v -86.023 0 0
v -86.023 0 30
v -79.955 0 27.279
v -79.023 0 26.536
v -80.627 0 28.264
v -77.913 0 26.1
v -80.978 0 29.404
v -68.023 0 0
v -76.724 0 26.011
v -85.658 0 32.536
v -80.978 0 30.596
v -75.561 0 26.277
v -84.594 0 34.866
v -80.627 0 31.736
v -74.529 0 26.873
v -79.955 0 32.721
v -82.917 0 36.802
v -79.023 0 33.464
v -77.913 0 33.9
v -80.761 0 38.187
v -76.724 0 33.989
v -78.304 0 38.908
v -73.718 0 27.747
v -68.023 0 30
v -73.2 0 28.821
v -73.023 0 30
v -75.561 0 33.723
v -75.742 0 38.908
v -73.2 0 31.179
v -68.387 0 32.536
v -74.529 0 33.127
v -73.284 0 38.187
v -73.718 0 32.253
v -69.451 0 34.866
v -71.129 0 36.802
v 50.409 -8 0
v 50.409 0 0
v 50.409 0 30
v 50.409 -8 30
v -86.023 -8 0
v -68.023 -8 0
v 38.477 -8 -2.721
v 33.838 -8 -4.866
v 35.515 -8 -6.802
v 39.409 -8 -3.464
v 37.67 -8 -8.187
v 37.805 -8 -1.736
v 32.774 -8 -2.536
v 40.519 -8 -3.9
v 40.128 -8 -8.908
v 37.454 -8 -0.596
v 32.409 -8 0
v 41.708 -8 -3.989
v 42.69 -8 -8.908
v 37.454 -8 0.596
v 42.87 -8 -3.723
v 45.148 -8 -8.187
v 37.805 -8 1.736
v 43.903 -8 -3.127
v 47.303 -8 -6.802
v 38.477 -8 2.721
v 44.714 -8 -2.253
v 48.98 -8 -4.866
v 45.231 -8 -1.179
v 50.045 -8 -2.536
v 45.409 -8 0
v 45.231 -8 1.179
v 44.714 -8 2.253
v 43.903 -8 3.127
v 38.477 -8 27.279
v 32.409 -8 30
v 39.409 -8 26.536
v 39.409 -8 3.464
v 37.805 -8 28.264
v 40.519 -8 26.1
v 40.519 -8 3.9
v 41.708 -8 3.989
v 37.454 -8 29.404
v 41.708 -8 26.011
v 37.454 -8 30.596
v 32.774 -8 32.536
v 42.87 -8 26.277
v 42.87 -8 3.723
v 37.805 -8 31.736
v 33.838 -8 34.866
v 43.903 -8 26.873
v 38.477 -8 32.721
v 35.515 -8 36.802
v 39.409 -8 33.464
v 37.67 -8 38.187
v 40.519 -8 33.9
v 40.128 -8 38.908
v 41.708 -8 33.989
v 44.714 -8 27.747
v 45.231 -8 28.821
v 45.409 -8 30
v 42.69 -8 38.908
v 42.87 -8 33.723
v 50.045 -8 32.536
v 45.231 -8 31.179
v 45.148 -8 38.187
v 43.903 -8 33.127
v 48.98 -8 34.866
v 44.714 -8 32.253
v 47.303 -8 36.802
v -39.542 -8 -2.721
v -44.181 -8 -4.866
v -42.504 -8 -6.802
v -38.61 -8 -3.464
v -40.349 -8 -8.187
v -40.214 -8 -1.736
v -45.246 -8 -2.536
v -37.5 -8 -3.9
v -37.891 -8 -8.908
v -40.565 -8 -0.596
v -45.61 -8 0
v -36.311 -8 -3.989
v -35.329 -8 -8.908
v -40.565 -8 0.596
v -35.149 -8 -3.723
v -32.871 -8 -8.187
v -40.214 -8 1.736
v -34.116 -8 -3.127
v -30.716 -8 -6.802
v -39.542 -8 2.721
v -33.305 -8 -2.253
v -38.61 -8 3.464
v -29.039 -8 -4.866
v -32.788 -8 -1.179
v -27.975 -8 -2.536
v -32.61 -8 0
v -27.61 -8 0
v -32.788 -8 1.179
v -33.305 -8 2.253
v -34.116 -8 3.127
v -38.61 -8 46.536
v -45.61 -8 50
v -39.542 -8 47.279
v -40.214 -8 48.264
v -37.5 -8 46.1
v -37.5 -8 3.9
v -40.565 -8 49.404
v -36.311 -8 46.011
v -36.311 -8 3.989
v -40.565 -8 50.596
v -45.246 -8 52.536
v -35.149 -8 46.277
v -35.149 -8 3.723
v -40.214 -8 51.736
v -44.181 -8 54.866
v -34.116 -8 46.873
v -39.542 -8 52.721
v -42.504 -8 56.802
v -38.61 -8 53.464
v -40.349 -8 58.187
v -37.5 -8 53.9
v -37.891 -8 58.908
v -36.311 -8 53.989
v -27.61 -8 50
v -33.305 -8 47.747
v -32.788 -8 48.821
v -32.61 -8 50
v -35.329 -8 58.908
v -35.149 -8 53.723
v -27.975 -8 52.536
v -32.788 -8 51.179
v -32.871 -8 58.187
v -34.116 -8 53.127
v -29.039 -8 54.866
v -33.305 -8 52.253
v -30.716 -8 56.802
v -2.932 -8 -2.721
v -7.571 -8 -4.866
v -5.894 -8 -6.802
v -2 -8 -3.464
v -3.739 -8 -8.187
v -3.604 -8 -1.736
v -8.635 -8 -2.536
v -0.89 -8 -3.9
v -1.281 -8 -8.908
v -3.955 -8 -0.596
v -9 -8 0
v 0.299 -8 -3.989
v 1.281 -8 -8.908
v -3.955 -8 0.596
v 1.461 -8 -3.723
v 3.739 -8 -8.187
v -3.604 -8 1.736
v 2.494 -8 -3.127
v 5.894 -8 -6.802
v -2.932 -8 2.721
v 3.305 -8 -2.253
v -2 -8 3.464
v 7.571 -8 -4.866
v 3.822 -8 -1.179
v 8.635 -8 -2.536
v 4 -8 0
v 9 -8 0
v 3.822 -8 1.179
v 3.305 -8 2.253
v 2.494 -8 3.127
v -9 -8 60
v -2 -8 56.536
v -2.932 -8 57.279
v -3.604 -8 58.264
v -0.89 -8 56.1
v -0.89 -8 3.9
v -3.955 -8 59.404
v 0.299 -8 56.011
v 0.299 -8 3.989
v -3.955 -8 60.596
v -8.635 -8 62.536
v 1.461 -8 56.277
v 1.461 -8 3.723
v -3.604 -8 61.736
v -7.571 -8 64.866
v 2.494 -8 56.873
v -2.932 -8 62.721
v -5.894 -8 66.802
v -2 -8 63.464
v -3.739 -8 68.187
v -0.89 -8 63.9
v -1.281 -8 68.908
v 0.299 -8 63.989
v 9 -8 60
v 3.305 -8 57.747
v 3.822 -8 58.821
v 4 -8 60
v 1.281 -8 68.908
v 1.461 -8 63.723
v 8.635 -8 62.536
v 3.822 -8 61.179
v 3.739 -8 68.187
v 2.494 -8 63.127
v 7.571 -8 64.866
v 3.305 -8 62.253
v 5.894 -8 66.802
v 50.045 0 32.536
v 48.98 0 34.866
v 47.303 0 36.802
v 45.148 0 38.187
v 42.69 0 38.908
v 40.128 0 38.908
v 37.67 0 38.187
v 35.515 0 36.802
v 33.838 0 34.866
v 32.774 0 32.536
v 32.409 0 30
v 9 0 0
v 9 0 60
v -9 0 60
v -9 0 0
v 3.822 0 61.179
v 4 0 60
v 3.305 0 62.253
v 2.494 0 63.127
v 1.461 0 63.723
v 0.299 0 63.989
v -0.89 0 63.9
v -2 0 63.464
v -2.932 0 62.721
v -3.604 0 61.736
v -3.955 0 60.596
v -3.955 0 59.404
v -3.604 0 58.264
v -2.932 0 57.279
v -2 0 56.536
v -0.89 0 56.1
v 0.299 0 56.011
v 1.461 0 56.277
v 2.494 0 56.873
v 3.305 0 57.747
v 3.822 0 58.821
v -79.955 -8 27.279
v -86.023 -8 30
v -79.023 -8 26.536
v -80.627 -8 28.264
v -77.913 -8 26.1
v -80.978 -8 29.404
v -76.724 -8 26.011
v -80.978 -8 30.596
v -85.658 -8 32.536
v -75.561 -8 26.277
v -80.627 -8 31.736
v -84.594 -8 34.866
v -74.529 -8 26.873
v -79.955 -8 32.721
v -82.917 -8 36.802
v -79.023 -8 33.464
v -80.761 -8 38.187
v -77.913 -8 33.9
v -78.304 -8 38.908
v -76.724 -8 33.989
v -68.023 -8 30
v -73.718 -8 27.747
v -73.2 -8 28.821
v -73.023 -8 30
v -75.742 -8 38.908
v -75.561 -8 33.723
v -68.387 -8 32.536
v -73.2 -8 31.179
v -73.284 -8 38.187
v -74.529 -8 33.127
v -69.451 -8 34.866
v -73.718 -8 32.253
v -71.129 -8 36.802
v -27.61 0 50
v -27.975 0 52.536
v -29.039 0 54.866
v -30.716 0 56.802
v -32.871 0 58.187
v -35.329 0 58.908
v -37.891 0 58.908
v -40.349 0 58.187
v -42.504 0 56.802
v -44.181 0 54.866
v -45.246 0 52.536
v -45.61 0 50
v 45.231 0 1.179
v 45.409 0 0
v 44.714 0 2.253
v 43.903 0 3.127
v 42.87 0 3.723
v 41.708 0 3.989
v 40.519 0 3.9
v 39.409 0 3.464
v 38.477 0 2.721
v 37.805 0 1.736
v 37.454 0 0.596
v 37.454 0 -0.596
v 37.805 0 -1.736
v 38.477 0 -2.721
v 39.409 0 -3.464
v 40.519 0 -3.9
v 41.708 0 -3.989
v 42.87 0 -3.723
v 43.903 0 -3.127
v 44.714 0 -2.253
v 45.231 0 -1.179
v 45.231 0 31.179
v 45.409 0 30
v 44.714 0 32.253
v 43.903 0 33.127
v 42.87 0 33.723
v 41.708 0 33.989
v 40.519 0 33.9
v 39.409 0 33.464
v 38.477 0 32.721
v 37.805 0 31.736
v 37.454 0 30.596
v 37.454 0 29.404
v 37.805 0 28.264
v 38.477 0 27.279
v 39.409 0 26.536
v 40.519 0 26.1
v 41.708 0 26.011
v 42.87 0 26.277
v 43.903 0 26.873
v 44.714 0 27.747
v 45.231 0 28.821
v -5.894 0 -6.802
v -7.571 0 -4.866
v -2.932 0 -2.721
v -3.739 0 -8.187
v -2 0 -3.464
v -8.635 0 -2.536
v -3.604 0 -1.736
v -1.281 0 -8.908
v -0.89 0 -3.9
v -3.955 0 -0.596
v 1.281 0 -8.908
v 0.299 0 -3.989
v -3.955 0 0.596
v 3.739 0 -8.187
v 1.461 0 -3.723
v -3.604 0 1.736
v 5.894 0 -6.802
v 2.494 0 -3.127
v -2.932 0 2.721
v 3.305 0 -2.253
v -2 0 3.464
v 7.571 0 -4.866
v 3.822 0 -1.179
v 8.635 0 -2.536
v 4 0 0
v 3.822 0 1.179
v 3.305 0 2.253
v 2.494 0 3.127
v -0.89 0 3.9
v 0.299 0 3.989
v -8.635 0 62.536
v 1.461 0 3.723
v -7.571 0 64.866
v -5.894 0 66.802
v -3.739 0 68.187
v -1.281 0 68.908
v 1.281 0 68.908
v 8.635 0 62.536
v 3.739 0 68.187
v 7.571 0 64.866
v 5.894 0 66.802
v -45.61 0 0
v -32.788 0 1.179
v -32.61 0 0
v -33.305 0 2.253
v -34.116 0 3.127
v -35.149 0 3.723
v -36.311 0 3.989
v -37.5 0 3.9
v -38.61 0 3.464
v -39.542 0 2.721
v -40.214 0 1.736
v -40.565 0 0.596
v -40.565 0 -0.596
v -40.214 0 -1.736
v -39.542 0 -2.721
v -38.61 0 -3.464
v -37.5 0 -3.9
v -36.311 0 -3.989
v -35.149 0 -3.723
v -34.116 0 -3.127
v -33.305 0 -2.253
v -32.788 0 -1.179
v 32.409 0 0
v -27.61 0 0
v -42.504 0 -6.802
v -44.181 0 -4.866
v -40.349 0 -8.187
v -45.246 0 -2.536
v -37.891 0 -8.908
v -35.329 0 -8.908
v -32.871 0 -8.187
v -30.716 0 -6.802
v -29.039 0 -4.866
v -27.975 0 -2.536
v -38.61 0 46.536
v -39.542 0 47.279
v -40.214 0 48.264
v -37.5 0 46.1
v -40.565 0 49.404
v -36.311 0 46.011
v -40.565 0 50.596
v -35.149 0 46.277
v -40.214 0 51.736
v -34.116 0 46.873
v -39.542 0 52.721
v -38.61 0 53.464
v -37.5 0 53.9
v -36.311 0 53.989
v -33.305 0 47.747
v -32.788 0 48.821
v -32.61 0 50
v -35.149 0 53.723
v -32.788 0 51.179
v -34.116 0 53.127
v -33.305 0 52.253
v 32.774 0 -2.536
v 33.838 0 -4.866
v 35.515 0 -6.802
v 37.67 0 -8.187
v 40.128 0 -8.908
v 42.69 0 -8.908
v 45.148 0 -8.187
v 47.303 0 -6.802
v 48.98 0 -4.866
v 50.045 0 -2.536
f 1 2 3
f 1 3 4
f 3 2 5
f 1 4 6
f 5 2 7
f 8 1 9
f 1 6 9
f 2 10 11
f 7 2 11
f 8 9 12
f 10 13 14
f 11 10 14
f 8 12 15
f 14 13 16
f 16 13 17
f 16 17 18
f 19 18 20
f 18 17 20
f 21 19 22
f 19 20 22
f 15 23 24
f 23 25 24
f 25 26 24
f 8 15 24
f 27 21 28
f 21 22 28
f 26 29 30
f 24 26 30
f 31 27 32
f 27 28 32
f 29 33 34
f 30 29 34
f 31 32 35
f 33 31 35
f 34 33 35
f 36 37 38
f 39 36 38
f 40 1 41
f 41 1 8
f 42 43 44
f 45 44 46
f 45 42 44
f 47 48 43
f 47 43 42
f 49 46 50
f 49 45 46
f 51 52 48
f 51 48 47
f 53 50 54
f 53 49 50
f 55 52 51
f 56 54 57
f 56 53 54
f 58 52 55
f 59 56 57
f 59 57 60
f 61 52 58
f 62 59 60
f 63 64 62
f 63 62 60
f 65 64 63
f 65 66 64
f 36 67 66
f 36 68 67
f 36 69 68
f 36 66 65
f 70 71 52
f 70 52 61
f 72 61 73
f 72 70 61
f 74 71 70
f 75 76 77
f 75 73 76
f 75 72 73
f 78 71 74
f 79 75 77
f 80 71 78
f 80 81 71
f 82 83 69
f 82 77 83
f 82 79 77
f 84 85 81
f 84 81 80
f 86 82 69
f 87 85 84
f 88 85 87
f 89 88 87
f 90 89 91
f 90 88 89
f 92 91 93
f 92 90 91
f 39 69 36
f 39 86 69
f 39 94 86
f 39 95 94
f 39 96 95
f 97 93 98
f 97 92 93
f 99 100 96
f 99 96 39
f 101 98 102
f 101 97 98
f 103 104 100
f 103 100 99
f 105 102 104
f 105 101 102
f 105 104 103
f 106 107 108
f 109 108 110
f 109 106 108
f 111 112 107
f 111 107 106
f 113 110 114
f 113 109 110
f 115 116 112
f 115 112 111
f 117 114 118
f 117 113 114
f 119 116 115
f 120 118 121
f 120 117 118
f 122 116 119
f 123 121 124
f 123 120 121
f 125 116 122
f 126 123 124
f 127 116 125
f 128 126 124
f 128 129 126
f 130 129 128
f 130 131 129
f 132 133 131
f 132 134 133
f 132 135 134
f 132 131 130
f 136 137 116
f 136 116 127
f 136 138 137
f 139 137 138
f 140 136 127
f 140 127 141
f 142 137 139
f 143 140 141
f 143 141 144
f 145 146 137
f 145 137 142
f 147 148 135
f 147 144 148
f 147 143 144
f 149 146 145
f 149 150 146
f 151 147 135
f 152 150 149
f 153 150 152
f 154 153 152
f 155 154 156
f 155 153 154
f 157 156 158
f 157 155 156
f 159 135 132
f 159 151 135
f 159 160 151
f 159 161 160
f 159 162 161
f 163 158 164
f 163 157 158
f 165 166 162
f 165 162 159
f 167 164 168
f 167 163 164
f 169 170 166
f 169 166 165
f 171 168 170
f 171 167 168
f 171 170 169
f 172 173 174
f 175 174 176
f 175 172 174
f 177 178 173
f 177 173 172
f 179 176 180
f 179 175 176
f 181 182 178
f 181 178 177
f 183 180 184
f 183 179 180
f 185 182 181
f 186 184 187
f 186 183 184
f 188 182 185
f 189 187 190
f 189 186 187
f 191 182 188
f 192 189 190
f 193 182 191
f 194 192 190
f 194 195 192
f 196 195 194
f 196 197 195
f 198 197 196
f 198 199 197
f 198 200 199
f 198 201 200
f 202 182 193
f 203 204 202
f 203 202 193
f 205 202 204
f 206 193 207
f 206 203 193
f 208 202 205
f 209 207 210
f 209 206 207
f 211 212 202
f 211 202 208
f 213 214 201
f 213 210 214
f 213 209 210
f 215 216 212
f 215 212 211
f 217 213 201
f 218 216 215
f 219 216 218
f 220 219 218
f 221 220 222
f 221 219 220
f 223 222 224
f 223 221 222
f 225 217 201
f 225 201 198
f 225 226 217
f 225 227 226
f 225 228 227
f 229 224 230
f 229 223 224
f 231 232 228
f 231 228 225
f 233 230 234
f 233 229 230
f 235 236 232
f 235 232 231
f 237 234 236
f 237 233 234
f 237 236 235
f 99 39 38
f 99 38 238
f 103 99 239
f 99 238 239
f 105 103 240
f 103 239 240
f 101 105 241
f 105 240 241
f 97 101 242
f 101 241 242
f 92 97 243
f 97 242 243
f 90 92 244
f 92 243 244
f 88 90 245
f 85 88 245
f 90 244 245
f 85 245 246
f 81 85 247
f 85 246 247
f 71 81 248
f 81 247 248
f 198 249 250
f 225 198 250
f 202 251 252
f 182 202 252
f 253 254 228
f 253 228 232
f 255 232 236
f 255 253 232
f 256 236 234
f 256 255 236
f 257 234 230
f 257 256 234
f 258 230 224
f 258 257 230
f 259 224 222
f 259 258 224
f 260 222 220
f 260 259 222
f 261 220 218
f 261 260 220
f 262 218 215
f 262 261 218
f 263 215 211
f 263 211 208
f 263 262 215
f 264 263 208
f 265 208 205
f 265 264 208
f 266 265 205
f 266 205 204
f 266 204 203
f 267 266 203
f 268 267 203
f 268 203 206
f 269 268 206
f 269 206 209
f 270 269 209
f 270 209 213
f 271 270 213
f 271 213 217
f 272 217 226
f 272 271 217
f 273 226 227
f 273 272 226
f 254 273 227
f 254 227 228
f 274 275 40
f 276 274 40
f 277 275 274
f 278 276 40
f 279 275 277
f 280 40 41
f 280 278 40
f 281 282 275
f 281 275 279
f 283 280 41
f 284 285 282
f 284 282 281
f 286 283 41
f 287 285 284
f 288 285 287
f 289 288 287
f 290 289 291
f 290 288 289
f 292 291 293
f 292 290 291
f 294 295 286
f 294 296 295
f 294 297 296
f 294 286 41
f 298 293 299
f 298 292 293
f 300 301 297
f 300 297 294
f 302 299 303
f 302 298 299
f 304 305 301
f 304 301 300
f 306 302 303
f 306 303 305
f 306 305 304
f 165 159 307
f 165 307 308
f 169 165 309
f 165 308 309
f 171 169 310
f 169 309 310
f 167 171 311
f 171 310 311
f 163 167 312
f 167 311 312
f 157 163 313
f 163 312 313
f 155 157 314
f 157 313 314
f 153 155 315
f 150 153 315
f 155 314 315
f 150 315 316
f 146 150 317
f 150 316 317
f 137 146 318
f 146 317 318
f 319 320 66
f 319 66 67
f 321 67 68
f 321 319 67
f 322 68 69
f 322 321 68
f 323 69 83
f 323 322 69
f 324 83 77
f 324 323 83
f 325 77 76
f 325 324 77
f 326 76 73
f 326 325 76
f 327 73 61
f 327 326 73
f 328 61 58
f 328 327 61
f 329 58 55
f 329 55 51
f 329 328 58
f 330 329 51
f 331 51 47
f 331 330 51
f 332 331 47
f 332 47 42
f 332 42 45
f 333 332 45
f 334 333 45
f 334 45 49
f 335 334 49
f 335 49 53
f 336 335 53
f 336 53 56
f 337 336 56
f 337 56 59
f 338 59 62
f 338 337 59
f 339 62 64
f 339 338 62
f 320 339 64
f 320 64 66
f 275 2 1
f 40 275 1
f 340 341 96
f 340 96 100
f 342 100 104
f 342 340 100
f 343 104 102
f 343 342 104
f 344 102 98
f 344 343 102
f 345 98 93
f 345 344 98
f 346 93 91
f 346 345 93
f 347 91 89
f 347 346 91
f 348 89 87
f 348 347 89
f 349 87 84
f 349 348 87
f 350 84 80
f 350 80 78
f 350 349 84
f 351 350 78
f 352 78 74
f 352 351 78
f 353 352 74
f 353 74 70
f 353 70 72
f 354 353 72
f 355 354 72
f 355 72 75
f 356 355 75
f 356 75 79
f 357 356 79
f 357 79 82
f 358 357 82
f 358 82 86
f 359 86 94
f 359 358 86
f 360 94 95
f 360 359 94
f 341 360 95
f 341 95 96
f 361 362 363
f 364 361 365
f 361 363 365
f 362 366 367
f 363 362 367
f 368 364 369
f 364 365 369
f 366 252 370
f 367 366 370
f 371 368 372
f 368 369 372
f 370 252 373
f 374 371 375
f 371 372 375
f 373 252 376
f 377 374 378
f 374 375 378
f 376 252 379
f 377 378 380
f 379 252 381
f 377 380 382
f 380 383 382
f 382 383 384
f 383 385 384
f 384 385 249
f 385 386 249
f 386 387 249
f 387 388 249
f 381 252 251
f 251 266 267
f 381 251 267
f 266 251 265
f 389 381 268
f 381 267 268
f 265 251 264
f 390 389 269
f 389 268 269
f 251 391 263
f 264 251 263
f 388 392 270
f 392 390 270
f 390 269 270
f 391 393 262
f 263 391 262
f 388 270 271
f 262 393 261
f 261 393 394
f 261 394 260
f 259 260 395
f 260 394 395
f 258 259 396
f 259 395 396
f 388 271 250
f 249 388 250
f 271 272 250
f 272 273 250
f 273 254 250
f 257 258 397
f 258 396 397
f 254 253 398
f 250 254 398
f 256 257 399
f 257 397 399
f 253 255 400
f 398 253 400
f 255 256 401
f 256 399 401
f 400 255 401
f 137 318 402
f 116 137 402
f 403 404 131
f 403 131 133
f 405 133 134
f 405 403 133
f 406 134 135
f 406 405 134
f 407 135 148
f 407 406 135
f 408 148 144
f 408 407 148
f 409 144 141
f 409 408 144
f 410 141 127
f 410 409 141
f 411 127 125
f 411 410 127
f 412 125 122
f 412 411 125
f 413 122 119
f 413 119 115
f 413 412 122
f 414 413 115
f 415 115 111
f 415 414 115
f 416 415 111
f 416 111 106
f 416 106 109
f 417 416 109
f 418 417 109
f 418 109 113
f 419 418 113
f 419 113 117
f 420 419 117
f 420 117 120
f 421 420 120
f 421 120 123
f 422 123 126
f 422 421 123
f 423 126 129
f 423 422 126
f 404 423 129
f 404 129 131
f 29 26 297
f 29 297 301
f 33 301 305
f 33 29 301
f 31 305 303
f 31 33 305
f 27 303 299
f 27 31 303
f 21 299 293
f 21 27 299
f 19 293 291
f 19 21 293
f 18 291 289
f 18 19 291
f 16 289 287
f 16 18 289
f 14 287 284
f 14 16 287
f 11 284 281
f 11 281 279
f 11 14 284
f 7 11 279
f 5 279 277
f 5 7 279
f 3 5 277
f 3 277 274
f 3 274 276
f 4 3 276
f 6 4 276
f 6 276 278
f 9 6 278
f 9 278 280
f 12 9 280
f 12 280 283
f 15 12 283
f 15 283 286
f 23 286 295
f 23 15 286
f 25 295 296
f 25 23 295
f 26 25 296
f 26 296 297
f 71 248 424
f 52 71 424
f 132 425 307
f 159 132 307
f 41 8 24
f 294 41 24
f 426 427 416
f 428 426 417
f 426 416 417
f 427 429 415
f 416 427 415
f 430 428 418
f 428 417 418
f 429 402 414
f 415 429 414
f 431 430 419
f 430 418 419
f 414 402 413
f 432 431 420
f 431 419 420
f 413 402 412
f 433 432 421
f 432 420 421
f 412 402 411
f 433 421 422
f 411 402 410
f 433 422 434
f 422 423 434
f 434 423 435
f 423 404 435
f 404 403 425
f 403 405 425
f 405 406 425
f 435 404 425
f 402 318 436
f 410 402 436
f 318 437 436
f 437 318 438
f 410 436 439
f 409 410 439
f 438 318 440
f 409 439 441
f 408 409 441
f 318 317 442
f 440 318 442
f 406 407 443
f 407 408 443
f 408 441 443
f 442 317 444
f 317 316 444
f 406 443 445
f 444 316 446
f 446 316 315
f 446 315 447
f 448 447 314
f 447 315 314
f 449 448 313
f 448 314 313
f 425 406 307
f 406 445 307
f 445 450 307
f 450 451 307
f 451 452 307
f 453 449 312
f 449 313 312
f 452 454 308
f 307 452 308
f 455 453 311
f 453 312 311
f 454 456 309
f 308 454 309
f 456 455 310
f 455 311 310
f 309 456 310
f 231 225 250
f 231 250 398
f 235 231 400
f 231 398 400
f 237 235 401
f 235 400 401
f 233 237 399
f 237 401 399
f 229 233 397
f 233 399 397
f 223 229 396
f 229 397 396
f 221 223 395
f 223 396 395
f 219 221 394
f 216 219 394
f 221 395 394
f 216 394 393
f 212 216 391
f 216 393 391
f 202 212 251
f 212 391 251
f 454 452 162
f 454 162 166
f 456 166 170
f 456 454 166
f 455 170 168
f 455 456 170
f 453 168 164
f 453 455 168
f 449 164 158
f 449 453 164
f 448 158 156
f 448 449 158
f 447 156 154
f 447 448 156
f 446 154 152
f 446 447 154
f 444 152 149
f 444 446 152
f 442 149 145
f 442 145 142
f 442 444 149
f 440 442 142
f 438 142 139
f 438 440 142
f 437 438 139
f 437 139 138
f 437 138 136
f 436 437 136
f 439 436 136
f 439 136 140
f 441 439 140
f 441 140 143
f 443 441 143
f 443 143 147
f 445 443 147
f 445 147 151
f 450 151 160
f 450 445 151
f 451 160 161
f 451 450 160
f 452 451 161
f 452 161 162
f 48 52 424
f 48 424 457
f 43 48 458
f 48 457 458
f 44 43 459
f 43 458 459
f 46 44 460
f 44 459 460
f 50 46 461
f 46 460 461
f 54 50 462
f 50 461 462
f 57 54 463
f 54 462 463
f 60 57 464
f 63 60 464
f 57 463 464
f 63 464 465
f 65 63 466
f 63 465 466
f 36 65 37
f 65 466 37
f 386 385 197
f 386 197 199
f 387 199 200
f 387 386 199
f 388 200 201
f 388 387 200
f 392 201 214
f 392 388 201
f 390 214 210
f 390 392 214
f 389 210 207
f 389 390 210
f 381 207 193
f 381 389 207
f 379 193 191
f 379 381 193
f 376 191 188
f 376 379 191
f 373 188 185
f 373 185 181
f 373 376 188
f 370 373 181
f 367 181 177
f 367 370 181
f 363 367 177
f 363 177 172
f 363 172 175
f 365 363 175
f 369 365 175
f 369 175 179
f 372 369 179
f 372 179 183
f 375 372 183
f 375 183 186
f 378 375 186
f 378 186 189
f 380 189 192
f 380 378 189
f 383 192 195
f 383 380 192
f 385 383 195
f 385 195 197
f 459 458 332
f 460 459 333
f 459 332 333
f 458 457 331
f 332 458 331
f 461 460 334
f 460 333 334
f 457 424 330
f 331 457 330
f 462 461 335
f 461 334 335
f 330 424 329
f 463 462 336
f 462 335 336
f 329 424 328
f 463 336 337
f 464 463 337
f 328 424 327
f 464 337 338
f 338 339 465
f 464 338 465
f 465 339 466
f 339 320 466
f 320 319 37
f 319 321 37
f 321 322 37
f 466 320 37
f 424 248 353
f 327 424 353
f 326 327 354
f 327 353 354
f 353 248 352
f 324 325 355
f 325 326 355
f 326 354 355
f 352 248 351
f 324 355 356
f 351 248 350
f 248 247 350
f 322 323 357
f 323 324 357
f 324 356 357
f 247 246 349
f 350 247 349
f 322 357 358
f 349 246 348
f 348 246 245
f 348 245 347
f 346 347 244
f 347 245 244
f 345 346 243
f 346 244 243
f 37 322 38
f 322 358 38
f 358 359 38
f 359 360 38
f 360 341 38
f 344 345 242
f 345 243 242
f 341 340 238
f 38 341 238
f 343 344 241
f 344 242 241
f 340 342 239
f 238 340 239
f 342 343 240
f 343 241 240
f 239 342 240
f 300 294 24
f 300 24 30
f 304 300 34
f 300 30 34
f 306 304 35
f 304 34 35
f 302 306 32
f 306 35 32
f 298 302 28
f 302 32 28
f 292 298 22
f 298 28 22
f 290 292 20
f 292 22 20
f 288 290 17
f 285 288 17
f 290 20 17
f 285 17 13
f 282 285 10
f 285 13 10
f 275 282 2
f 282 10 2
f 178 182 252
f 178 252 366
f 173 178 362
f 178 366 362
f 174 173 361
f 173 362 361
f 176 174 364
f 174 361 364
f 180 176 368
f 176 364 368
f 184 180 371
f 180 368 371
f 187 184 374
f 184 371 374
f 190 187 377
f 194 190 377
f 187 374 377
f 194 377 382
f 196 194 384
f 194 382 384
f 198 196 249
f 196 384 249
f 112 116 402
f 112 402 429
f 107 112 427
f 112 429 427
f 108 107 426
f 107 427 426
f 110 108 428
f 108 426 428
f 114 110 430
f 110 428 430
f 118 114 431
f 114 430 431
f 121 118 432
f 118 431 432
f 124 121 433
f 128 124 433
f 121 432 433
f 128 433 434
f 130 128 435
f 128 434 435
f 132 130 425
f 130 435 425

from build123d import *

# Parameters (mm, degrees)
F1_R     = 4
F2_DEPTH = 8
F3_R     = 4
F4_DEPTH = 8
F5_R     = 4
F6_DEPTH = 8
F7_R     = 4
F8_DEPTH = 8


with BuildPart() as f2:
    # F1 (on Front) → F2 (new body)
    with BuildSketch(Plane.XZ):
        with BuildLine():
            Line((-9, 60), (-9, 0))
            ThreePointArc((-9, 0), (0, -9), (9, 0))
            Line((9, 0), (9, 60))
            ThreePointArc((9, 60), (0, 69), (-9, 60))
        make_face()
        Circle(F1_R, mode=Mode.SUBTRACT)
        with Locations((0, 60)):
            Circle(F1_R, mode=Mode.SUBTRACT)
    extrude(amount=F2_DEPTH)


with BuildPart() as f4:
    # F3 (on Front) → F4 (new body)
    with BuildSketch(Plane.XZ):
        with BuildLine():
            Line((-45.6101530673, 50), (-45.6101530673, 0))
            ThreePointArc((-45.6101530673, 0), (-36.6101530673, -9), (-27.6101530673, 0))
            Line((-27.6101530673, 0), (-27.6101530673, 50))
            ThreePointArc((-27.6101530673, 50), (-36.6101530673, 59), (-45.6101530673, 50))
        make_face()
        with Locations((-36.6101530673, 0)):
            Circle(F3_R, mode=Mode.SUBTRACT)
        with Locations((-36.6101530673, 50)):
            Circle(F3_R, mode=Mode.SUBTRACT)
    extrude(amount=F4_DEPTH)


with BuildPart() as f6:
    # F5 (on Front) → F6 (new body)
    with BuildSketch(Plane.XZ):
        with BuildLine():
            Line((32.4090709025, 30), (32.4090709025, 0))
            ThreePointArc((32.4090709025, 0), (41.4090709025, -9), (50.4090709025, 0))
            Line((50.4090709025, 0), (50.4090709025, 30))
            ThreePointArc((50.4090709025, 30), (41.4090709025, 39), (32.4090709025, 30))
        make_face()
        with Locations((41.4090709025, 0)):
            Circle(F5_R, mode=Mode.SUBTRACT)
        with Locations((41.4090709025, 30)):
            Circle(F5_R, mode=Mode.SUBTRACT)
    extrude(amount=F6_DEPTH)


with BuildPart() as f8:
    # F7 (on Front) → F8 (new body)
    with BuildSketch(Plane.XZ):
        with BuildLine():
            Line((-68.0227638346, 0), (-68.0227638346, 30))
            ThreePointArc((-68.0227638346, 30), (-77.0227638346, 39), (-86.0227638346, 30))
            Line((-86.0227638346, 30), (-86.0227638346, 0))
            Line((-86.0227638346, 0), (-68.0227638346, 0))
        make_face()
        with Locations((-77.0227638346, 30)):
            Circle(F7_R, mode=Mode.SUBTRACT)
    extrude(amount=F8_DEPTH)


solid = Compound([f2.part, f4.part, f6.part, f8.part])
